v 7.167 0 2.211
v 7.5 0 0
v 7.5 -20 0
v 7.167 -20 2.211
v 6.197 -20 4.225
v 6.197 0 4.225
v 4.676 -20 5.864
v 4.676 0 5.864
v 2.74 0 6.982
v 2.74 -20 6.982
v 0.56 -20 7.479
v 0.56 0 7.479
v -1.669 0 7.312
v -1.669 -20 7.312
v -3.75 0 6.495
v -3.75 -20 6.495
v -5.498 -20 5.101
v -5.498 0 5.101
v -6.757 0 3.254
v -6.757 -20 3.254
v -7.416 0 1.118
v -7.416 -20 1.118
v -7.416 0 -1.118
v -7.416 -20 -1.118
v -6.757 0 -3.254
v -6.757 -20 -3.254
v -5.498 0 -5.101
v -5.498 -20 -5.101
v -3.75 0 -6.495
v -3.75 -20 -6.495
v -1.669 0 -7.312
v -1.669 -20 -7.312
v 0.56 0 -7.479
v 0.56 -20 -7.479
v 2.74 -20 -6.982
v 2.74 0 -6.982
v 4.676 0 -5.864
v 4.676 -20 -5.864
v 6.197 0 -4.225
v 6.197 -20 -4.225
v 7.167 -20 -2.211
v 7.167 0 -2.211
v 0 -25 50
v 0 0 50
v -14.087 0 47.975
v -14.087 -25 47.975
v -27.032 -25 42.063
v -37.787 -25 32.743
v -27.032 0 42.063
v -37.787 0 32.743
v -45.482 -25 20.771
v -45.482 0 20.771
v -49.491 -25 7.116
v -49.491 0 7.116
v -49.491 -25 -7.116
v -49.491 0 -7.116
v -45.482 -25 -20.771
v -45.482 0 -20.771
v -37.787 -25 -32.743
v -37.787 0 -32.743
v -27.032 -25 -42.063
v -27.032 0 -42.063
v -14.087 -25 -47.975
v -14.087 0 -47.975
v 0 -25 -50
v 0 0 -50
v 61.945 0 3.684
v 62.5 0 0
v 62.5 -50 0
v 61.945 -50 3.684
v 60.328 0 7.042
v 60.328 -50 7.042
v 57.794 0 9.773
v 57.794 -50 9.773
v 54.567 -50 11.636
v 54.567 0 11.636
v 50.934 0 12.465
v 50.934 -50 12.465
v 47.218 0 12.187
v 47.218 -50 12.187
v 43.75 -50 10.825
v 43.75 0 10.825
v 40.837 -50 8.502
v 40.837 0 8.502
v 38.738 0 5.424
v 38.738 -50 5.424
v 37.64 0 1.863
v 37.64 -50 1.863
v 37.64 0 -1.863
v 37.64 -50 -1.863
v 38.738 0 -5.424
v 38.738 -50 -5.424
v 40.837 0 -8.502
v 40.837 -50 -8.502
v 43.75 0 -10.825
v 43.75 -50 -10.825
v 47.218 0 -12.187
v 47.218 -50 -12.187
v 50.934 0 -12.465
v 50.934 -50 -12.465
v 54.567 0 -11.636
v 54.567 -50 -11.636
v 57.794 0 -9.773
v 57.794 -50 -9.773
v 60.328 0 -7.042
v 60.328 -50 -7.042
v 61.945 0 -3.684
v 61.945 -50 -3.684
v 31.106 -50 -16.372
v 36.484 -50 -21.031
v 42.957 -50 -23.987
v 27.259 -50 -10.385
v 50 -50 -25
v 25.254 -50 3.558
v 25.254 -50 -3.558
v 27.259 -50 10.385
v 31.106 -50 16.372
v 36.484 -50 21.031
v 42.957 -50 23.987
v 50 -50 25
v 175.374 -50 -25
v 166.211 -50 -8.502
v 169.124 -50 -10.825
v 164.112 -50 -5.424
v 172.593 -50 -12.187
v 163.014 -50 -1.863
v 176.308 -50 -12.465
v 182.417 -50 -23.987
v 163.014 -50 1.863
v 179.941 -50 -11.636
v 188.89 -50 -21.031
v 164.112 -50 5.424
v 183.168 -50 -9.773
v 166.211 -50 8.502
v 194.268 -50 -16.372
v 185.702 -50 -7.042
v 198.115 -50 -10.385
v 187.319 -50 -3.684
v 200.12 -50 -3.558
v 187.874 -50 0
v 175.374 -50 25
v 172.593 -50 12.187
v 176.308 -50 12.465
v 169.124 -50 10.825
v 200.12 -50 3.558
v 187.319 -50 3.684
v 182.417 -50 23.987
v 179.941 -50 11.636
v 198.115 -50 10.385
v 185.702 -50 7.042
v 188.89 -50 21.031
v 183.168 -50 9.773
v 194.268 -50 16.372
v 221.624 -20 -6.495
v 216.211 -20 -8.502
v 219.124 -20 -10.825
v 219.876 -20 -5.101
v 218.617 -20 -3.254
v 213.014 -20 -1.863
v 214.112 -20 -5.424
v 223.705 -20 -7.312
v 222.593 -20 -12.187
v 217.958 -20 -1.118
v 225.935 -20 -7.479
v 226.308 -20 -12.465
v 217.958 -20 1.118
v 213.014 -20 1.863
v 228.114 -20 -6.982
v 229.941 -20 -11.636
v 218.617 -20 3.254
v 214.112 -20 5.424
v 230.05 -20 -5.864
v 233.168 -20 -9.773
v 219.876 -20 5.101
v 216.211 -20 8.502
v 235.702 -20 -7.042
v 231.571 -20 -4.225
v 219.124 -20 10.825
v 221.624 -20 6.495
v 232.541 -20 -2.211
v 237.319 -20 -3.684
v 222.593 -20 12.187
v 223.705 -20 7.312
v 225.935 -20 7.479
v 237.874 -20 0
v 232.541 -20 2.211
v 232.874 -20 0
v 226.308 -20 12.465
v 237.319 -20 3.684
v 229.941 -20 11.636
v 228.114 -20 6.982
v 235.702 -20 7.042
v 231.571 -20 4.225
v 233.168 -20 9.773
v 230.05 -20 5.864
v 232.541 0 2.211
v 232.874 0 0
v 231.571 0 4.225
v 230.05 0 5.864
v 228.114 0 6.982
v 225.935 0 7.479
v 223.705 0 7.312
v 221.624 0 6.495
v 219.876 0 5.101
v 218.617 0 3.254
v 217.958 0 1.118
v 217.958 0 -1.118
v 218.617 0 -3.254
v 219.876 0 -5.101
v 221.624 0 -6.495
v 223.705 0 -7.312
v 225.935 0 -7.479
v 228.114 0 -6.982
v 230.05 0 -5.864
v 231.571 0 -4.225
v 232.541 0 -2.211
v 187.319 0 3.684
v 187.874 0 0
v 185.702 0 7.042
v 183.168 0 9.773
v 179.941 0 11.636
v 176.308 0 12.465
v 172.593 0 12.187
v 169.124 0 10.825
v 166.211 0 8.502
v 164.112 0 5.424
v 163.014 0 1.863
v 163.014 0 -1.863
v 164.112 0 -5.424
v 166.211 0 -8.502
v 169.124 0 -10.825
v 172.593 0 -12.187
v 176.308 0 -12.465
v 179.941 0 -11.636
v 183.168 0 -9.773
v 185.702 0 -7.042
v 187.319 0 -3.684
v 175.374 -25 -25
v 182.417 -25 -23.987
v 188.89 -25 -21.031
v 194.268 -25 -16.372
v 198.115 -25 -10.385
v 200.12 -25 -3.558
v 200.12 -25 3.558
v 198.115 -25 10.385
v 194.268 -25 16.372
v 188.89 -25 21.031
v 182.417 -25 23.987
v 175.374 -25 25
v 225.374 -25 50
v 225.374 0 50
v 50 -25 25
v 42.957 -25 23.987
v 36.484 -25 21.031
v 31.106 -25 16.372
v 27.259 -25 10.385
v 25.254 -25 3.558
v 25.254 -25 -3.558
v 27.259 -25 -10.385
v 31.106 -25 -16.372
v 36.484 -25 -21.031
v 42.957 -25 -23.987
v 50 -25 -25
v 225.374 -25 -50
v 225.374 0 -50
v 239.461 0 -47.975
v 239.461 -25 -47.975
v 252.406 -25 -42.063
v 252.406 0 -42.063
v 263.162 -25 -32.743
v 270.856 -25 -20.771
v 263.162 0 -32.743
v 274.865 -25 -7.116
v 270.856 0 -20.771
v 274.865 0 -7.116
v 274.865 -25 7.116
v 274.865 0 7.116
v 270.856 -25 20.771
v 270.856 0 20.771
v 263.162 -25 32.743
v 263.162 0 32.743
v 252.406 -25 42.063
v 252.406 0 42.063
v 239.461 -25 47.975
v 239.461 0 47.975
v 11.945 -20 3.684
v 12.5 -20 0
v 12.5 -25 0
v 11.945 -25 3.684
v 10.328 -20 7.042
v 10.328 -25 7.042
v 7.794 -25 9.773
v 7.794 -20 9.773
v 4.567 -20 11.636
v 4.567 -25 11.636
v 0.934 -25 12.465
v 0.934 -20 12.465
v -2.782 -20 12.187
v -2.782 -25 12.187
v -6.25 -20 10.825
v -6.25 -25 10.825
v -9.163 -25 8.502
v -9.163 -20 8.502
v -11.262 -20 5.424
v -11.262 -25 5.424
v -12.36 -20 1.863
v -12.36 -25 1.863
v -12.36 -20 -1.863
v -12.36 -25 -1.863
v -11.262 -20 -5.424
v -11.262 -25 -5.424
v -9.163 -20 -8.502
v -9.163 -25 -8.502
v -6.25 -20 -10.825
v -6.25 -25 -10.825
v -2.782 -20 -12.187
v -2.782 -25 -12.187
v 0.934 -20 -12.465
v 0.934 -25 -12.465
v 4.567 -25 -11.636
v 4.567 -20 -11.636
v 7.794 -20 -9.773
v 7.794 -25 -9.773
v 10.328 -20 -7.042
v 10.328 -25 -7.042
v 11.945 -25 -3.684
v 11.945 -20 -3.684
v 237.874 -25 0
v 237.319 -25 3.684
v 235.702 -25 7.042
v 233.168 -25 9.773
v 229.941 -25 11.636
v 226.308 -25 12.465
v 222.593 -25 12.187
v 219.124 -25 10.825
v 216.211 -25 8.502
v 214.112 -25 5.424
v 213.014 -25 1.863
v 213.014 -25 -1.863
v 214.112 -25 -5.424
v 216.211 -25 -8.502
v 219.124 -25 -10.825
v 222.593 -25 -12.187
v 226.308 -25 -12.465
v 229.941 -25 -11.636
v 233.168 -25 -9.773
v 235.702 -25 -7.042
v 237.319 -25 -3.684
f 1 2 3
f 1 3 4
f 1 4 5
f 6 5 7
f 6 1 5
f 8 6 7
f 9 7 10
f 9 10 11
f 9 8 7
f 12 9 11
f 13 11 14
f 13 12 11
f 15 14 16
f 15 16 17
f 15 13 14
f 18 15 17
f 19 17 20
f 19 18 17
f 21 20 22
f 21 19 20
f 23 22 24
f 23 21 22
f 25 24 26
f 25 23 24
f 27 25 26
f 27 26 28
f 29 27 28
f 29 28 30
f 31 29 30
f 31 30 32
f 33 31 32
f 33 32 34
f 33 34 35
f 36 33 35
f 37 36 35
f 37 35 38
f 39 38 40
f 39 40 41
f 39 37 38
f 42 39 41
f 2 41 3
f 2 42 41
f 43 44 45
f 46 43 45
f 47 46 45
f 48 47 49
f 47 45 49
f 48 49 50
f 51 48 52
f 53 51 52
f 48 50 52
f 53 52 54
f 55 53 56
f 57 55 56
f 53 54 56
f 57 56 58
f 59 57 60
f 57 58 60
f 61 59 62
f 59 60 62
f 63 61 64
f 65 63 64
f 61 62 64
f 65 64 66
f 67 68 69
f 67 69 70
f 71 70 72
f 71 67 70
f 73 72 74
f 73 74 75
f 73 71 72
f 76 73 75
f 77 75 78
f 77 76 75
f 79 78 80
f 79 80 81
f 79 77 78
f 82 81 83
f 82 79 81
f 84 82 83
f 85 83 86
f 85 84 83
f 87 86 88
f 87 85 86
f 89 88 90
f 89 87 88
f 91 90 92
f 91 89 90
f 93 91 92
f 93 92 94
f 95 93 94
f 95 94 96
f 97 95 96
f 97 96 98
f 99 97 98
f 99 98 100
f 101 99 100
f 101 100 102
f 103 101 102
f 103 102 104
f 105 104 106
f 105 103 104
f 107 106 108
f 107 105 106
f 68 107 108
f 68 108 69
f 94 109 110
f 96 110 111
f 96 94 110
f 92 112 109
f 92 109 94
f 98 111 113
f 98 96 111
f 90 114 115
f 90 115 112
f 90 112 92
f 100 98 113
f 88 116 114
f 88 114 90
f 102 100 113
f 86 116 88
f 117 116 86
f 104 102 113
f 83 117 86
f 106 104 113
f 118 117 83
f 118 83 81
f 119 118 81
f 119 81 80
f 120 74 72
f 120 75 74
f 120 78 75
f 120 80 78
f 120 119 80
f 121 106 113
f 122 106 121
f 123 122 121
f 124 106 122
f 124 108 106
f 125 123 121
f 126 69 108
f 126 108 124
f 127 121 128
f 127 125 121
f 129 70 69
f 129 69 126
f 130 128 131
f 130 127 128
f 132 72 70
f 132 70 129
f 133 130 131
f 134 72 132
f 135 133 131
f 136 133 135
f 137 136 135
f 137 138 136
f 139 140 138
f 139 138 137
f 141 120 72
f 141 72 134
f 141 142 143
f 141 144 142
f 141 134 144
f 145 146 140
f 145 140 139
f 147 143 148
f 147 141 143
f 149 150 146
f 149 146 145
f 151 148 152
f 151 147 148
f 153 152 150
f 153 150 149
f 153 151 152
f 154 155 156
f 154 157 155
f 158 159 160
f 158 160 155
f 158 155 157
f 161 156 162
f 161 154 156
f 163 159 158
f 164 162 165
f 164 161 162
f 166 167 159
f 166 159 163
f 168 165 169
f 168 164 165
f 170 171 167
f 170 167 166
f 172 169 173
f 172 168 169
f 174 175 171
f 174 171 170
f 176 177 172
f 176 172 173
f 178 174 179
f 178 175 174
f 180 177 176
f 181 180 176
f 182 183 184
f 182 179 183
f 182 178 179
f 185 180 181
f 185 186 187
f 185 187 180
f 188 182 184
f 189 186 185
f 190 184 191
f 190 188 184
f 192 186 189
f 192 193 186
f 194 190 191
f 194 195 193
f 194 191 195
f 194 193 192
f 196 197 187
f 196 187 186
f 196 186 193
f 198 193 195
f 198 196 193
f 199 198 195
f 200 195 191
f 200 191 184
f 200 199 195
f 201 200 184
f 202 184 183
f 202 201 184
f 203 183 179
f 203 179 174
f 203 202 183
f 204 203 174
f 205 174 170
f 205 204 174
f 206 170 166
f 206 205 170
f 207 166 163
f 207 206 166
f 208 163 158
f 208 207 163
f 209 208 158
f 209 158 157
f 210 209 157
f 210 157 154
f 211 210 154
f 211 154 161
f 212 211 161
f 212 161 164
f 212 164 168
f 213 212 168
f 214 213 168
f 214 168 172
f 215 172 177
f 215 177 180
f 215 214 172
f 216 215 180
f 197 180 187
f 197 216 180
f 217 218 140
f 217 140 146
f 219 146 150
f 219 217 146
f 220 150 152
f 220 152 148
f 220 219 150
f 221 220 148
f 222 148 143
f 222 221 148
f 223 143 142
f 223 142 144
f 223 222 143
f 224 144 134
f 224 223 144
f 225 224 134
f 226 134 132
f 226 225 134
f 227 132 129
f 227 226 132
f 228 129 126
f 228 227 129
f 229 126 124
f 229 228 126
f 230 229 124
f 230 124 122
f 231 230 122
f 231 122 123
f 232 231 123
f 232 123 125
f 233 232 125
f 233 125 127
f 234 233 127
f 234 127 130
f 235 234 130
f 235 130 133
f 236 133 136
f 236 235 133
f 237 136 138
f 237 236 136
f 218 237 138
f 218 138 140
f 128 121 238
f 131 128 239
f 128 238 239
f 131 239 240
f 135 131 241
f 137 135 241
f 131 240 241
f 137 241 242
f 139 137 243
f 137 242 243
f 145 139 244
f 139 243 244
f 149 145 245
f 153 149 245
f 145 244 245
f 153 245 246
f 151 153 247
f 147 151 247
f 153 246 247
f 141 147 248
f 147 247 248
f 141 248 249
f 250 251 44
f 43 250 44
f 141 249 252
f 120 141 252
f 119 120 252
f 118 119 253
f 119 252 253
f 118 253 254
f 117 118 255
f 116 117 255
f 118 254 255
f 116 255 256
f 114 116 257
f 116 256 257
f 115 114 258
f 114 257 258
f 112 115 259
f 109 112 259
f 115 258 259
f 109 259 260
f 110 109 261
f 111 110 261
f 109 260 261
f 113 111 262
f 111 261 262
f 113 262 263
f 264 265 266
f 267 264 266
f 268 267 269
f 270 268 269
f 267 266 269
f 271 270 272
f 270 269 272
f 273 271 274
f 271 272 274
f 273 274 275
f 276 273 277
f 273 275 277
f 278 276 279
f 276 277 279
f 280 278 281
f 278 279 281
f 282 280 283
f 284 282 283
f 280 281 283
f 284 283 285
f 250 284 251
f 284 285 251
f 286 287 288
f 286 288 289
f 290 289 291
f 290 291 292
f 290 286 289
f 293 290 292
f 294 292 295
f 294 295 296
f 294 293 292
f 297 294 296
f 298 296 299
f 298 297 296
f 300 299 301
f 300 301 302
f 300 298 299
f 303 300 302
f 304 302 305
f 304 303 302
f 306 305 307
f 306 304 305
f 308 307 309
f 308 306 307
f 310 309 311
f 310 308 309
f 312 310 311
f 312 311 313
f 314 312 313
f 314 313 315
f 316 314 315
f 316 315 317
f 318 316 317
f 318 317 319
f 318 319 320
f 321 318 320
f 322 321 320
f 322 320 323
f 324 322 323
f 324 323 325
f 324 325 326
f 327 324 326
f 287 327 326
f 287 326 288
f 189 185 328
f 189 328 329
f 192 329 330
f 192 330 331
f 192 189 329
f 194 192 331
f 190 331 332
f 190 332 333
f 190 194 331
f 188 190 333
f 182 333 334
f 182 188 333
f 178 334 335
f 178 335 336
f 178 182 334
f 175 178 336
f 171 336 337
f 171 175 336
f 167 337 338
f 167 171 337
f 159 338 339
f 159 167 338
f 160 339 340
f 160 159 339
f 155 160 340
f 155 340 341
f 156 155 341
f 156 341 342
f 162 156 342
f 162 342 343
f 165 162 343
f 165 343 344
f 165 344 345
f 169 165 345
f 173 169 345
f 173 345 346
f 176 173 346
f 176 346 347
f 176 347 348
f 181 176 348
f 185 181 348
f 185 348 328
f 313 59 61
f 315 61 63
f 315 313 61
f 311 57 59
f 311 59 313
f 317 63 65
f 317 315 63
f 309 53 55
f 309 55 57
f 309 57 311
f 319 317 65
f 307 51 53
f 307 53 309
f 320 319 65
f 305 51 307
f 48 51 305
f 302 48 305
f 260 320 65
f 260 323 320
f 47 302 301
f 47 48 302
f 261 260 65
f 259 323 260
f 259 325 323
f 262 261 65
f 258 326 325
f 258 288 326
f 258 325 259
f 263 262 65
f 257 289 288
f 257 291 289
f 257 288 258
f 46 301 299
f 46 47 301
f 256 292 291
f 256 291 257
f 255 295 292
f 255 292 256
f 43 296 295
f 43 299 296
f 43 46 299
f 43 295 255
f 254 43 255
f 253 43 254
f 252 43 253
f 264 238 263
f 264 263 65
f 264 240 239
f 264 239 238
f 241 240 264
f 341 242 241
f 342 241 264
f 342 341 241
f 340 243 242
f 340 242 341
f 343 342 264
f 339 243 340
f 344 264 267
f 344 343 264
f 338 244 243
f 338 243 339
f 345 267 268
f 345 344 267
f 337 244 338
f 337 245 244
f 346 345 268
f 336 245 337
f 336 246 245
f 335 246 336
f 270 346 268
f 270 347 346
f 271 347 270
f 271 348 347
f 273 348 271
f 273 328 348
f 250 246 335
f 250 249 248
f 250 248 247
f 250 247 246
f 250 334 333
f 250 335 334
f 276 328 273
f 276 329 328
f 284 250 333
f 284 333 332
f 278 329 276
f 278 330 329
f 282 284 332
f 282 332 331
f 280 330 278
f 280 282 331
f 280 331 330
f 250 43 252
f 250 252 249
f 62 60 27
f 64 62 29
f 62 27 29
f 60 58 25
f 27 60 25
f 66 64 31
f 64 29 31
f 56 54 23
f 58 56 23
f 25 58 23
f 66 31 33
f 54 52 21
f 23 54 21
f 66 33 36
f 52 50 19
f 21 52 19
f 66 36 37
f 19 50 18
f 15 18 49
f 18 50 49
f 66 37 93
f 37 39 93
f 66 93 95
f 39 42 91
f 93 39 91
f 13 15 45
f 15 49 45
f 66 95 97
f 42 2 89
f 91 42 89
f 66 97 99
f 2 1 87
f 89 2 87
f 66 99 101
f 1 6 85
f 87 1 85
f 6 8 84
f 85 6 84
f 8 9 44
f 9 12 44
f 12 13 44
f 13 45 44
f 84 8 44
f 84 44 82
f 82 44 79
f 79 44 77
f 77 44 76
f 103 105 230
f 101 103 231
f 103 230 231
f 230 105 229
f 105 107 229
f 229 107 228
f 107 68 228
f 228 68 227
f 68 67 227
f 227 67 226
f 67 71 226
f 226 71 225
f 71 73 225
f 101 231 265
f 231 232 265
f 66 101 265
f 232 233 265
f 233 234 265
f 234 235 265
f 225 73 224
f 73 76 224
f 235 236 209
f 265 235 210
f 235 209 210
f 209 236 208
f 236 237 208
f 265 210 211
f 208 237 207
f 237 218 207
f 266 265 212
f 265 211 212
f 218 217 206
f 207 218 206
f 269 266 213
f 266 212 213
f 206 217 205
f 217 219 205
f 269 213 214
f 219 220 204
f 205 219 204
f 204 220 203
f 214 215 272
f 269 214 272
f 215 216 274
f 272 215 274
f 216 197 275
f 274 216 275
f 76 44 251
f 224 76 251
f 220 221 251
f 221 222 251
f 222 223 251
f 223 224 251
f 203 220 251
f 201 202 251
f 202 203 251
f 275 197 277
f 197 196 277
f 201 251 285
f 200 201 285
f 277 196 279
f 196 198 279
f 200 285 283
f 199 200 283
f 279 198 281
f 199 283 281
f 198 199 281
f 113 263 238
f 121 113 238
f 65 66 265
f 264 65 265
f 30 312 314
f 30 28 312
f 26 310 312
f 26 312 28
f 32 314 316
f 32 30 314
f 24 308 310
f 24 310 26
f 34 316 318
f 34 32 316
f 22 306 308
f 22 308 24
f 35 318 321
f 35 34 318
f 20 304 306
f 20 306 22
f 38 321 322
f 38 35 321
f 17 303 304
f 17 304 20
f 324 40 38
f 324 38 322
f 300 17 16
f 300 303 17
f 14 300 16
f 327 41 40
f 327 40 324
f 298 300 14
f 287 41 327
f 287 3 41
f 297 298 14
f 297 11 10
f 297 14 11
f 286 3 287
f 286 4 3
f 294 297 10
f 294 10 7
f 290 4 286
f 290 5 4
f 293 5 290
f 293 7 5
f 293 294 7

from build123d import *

# Parameters (mm, degrees)
F0_R     = 12.5
F1_DEPTH = 50
F2_DEPTH = 25
F0_R_2   = 7.5
F3_DEPTH = 20


with BuildPart() as f1:
    # F0 (on Front) → F1 (new body)
    with BuildSketch(Plane.XZ):
        with BuildLine():
            Line((175.374043, 25), (50, 25))
            ThreePointArc((50, 25), (25, 0), (50, -25))
            Line((50, -25), (175.374043, -25))
            ThreePointArc((175.374043, -25), (200.374043, 0), (175.374043, 25))
        make_face()
        with Locations((50, 0)):
            Circle(F0_R, mode=Mode.SUBTRACT)
        with Locations((175.374043, 0)):
            Circle(F0_R, mode=Mode.SUBTRACT)
    extrude(amount=F1_DEPTH)

    # F0 (on Front) → F2 (join)
    with BuildSketch(Plane.XZ):
        with BuildLine():
            Line((225.374043, 50), (0, 50))
            ThreePointArc((0, 50), (-50, 0), (0, -50))
            Line((0, -50), (225.374043, -50))
            ThreePointArc((225.374043, -50), (275.374043, 0), (225.374043, 50))
        make_face()
        Circle(F0_R, mode=Mode.SUBTRACT)
        with BuildLine():
            ThreePointArc((50, -25), (25, 0), (50, 25))
            Line((50, 25), (175.374043, 25))
            ThreePointArc((175.374043, 25), (200.374043, 0), (175.374043, -25))
            Line((175.374043, -25), (50, -25))
        make_face(mode=Mode.SUBTRACT)
        with Locations((225.374043, 0)):
            Circle(F0_R, mode=Mode.SUBTRACT)
    extrude(amount=F2_DEPTH)

    # F0 (on Front) → F3 (join)
    with BuildSketch(Plane.XZ):
        Circle(F0_R)
        Circle(F0_R_2, mode=Mode.SUBTRACT)
        with Locations((225.374043, 0)):
            Circle(F0_R)
        with Locations((225.374043, 0)):
            Circle(F0_R_2, mode=Mode.SUBTRACT)
    extrude(amount=F3_DEPTH)


solid = f1.part
